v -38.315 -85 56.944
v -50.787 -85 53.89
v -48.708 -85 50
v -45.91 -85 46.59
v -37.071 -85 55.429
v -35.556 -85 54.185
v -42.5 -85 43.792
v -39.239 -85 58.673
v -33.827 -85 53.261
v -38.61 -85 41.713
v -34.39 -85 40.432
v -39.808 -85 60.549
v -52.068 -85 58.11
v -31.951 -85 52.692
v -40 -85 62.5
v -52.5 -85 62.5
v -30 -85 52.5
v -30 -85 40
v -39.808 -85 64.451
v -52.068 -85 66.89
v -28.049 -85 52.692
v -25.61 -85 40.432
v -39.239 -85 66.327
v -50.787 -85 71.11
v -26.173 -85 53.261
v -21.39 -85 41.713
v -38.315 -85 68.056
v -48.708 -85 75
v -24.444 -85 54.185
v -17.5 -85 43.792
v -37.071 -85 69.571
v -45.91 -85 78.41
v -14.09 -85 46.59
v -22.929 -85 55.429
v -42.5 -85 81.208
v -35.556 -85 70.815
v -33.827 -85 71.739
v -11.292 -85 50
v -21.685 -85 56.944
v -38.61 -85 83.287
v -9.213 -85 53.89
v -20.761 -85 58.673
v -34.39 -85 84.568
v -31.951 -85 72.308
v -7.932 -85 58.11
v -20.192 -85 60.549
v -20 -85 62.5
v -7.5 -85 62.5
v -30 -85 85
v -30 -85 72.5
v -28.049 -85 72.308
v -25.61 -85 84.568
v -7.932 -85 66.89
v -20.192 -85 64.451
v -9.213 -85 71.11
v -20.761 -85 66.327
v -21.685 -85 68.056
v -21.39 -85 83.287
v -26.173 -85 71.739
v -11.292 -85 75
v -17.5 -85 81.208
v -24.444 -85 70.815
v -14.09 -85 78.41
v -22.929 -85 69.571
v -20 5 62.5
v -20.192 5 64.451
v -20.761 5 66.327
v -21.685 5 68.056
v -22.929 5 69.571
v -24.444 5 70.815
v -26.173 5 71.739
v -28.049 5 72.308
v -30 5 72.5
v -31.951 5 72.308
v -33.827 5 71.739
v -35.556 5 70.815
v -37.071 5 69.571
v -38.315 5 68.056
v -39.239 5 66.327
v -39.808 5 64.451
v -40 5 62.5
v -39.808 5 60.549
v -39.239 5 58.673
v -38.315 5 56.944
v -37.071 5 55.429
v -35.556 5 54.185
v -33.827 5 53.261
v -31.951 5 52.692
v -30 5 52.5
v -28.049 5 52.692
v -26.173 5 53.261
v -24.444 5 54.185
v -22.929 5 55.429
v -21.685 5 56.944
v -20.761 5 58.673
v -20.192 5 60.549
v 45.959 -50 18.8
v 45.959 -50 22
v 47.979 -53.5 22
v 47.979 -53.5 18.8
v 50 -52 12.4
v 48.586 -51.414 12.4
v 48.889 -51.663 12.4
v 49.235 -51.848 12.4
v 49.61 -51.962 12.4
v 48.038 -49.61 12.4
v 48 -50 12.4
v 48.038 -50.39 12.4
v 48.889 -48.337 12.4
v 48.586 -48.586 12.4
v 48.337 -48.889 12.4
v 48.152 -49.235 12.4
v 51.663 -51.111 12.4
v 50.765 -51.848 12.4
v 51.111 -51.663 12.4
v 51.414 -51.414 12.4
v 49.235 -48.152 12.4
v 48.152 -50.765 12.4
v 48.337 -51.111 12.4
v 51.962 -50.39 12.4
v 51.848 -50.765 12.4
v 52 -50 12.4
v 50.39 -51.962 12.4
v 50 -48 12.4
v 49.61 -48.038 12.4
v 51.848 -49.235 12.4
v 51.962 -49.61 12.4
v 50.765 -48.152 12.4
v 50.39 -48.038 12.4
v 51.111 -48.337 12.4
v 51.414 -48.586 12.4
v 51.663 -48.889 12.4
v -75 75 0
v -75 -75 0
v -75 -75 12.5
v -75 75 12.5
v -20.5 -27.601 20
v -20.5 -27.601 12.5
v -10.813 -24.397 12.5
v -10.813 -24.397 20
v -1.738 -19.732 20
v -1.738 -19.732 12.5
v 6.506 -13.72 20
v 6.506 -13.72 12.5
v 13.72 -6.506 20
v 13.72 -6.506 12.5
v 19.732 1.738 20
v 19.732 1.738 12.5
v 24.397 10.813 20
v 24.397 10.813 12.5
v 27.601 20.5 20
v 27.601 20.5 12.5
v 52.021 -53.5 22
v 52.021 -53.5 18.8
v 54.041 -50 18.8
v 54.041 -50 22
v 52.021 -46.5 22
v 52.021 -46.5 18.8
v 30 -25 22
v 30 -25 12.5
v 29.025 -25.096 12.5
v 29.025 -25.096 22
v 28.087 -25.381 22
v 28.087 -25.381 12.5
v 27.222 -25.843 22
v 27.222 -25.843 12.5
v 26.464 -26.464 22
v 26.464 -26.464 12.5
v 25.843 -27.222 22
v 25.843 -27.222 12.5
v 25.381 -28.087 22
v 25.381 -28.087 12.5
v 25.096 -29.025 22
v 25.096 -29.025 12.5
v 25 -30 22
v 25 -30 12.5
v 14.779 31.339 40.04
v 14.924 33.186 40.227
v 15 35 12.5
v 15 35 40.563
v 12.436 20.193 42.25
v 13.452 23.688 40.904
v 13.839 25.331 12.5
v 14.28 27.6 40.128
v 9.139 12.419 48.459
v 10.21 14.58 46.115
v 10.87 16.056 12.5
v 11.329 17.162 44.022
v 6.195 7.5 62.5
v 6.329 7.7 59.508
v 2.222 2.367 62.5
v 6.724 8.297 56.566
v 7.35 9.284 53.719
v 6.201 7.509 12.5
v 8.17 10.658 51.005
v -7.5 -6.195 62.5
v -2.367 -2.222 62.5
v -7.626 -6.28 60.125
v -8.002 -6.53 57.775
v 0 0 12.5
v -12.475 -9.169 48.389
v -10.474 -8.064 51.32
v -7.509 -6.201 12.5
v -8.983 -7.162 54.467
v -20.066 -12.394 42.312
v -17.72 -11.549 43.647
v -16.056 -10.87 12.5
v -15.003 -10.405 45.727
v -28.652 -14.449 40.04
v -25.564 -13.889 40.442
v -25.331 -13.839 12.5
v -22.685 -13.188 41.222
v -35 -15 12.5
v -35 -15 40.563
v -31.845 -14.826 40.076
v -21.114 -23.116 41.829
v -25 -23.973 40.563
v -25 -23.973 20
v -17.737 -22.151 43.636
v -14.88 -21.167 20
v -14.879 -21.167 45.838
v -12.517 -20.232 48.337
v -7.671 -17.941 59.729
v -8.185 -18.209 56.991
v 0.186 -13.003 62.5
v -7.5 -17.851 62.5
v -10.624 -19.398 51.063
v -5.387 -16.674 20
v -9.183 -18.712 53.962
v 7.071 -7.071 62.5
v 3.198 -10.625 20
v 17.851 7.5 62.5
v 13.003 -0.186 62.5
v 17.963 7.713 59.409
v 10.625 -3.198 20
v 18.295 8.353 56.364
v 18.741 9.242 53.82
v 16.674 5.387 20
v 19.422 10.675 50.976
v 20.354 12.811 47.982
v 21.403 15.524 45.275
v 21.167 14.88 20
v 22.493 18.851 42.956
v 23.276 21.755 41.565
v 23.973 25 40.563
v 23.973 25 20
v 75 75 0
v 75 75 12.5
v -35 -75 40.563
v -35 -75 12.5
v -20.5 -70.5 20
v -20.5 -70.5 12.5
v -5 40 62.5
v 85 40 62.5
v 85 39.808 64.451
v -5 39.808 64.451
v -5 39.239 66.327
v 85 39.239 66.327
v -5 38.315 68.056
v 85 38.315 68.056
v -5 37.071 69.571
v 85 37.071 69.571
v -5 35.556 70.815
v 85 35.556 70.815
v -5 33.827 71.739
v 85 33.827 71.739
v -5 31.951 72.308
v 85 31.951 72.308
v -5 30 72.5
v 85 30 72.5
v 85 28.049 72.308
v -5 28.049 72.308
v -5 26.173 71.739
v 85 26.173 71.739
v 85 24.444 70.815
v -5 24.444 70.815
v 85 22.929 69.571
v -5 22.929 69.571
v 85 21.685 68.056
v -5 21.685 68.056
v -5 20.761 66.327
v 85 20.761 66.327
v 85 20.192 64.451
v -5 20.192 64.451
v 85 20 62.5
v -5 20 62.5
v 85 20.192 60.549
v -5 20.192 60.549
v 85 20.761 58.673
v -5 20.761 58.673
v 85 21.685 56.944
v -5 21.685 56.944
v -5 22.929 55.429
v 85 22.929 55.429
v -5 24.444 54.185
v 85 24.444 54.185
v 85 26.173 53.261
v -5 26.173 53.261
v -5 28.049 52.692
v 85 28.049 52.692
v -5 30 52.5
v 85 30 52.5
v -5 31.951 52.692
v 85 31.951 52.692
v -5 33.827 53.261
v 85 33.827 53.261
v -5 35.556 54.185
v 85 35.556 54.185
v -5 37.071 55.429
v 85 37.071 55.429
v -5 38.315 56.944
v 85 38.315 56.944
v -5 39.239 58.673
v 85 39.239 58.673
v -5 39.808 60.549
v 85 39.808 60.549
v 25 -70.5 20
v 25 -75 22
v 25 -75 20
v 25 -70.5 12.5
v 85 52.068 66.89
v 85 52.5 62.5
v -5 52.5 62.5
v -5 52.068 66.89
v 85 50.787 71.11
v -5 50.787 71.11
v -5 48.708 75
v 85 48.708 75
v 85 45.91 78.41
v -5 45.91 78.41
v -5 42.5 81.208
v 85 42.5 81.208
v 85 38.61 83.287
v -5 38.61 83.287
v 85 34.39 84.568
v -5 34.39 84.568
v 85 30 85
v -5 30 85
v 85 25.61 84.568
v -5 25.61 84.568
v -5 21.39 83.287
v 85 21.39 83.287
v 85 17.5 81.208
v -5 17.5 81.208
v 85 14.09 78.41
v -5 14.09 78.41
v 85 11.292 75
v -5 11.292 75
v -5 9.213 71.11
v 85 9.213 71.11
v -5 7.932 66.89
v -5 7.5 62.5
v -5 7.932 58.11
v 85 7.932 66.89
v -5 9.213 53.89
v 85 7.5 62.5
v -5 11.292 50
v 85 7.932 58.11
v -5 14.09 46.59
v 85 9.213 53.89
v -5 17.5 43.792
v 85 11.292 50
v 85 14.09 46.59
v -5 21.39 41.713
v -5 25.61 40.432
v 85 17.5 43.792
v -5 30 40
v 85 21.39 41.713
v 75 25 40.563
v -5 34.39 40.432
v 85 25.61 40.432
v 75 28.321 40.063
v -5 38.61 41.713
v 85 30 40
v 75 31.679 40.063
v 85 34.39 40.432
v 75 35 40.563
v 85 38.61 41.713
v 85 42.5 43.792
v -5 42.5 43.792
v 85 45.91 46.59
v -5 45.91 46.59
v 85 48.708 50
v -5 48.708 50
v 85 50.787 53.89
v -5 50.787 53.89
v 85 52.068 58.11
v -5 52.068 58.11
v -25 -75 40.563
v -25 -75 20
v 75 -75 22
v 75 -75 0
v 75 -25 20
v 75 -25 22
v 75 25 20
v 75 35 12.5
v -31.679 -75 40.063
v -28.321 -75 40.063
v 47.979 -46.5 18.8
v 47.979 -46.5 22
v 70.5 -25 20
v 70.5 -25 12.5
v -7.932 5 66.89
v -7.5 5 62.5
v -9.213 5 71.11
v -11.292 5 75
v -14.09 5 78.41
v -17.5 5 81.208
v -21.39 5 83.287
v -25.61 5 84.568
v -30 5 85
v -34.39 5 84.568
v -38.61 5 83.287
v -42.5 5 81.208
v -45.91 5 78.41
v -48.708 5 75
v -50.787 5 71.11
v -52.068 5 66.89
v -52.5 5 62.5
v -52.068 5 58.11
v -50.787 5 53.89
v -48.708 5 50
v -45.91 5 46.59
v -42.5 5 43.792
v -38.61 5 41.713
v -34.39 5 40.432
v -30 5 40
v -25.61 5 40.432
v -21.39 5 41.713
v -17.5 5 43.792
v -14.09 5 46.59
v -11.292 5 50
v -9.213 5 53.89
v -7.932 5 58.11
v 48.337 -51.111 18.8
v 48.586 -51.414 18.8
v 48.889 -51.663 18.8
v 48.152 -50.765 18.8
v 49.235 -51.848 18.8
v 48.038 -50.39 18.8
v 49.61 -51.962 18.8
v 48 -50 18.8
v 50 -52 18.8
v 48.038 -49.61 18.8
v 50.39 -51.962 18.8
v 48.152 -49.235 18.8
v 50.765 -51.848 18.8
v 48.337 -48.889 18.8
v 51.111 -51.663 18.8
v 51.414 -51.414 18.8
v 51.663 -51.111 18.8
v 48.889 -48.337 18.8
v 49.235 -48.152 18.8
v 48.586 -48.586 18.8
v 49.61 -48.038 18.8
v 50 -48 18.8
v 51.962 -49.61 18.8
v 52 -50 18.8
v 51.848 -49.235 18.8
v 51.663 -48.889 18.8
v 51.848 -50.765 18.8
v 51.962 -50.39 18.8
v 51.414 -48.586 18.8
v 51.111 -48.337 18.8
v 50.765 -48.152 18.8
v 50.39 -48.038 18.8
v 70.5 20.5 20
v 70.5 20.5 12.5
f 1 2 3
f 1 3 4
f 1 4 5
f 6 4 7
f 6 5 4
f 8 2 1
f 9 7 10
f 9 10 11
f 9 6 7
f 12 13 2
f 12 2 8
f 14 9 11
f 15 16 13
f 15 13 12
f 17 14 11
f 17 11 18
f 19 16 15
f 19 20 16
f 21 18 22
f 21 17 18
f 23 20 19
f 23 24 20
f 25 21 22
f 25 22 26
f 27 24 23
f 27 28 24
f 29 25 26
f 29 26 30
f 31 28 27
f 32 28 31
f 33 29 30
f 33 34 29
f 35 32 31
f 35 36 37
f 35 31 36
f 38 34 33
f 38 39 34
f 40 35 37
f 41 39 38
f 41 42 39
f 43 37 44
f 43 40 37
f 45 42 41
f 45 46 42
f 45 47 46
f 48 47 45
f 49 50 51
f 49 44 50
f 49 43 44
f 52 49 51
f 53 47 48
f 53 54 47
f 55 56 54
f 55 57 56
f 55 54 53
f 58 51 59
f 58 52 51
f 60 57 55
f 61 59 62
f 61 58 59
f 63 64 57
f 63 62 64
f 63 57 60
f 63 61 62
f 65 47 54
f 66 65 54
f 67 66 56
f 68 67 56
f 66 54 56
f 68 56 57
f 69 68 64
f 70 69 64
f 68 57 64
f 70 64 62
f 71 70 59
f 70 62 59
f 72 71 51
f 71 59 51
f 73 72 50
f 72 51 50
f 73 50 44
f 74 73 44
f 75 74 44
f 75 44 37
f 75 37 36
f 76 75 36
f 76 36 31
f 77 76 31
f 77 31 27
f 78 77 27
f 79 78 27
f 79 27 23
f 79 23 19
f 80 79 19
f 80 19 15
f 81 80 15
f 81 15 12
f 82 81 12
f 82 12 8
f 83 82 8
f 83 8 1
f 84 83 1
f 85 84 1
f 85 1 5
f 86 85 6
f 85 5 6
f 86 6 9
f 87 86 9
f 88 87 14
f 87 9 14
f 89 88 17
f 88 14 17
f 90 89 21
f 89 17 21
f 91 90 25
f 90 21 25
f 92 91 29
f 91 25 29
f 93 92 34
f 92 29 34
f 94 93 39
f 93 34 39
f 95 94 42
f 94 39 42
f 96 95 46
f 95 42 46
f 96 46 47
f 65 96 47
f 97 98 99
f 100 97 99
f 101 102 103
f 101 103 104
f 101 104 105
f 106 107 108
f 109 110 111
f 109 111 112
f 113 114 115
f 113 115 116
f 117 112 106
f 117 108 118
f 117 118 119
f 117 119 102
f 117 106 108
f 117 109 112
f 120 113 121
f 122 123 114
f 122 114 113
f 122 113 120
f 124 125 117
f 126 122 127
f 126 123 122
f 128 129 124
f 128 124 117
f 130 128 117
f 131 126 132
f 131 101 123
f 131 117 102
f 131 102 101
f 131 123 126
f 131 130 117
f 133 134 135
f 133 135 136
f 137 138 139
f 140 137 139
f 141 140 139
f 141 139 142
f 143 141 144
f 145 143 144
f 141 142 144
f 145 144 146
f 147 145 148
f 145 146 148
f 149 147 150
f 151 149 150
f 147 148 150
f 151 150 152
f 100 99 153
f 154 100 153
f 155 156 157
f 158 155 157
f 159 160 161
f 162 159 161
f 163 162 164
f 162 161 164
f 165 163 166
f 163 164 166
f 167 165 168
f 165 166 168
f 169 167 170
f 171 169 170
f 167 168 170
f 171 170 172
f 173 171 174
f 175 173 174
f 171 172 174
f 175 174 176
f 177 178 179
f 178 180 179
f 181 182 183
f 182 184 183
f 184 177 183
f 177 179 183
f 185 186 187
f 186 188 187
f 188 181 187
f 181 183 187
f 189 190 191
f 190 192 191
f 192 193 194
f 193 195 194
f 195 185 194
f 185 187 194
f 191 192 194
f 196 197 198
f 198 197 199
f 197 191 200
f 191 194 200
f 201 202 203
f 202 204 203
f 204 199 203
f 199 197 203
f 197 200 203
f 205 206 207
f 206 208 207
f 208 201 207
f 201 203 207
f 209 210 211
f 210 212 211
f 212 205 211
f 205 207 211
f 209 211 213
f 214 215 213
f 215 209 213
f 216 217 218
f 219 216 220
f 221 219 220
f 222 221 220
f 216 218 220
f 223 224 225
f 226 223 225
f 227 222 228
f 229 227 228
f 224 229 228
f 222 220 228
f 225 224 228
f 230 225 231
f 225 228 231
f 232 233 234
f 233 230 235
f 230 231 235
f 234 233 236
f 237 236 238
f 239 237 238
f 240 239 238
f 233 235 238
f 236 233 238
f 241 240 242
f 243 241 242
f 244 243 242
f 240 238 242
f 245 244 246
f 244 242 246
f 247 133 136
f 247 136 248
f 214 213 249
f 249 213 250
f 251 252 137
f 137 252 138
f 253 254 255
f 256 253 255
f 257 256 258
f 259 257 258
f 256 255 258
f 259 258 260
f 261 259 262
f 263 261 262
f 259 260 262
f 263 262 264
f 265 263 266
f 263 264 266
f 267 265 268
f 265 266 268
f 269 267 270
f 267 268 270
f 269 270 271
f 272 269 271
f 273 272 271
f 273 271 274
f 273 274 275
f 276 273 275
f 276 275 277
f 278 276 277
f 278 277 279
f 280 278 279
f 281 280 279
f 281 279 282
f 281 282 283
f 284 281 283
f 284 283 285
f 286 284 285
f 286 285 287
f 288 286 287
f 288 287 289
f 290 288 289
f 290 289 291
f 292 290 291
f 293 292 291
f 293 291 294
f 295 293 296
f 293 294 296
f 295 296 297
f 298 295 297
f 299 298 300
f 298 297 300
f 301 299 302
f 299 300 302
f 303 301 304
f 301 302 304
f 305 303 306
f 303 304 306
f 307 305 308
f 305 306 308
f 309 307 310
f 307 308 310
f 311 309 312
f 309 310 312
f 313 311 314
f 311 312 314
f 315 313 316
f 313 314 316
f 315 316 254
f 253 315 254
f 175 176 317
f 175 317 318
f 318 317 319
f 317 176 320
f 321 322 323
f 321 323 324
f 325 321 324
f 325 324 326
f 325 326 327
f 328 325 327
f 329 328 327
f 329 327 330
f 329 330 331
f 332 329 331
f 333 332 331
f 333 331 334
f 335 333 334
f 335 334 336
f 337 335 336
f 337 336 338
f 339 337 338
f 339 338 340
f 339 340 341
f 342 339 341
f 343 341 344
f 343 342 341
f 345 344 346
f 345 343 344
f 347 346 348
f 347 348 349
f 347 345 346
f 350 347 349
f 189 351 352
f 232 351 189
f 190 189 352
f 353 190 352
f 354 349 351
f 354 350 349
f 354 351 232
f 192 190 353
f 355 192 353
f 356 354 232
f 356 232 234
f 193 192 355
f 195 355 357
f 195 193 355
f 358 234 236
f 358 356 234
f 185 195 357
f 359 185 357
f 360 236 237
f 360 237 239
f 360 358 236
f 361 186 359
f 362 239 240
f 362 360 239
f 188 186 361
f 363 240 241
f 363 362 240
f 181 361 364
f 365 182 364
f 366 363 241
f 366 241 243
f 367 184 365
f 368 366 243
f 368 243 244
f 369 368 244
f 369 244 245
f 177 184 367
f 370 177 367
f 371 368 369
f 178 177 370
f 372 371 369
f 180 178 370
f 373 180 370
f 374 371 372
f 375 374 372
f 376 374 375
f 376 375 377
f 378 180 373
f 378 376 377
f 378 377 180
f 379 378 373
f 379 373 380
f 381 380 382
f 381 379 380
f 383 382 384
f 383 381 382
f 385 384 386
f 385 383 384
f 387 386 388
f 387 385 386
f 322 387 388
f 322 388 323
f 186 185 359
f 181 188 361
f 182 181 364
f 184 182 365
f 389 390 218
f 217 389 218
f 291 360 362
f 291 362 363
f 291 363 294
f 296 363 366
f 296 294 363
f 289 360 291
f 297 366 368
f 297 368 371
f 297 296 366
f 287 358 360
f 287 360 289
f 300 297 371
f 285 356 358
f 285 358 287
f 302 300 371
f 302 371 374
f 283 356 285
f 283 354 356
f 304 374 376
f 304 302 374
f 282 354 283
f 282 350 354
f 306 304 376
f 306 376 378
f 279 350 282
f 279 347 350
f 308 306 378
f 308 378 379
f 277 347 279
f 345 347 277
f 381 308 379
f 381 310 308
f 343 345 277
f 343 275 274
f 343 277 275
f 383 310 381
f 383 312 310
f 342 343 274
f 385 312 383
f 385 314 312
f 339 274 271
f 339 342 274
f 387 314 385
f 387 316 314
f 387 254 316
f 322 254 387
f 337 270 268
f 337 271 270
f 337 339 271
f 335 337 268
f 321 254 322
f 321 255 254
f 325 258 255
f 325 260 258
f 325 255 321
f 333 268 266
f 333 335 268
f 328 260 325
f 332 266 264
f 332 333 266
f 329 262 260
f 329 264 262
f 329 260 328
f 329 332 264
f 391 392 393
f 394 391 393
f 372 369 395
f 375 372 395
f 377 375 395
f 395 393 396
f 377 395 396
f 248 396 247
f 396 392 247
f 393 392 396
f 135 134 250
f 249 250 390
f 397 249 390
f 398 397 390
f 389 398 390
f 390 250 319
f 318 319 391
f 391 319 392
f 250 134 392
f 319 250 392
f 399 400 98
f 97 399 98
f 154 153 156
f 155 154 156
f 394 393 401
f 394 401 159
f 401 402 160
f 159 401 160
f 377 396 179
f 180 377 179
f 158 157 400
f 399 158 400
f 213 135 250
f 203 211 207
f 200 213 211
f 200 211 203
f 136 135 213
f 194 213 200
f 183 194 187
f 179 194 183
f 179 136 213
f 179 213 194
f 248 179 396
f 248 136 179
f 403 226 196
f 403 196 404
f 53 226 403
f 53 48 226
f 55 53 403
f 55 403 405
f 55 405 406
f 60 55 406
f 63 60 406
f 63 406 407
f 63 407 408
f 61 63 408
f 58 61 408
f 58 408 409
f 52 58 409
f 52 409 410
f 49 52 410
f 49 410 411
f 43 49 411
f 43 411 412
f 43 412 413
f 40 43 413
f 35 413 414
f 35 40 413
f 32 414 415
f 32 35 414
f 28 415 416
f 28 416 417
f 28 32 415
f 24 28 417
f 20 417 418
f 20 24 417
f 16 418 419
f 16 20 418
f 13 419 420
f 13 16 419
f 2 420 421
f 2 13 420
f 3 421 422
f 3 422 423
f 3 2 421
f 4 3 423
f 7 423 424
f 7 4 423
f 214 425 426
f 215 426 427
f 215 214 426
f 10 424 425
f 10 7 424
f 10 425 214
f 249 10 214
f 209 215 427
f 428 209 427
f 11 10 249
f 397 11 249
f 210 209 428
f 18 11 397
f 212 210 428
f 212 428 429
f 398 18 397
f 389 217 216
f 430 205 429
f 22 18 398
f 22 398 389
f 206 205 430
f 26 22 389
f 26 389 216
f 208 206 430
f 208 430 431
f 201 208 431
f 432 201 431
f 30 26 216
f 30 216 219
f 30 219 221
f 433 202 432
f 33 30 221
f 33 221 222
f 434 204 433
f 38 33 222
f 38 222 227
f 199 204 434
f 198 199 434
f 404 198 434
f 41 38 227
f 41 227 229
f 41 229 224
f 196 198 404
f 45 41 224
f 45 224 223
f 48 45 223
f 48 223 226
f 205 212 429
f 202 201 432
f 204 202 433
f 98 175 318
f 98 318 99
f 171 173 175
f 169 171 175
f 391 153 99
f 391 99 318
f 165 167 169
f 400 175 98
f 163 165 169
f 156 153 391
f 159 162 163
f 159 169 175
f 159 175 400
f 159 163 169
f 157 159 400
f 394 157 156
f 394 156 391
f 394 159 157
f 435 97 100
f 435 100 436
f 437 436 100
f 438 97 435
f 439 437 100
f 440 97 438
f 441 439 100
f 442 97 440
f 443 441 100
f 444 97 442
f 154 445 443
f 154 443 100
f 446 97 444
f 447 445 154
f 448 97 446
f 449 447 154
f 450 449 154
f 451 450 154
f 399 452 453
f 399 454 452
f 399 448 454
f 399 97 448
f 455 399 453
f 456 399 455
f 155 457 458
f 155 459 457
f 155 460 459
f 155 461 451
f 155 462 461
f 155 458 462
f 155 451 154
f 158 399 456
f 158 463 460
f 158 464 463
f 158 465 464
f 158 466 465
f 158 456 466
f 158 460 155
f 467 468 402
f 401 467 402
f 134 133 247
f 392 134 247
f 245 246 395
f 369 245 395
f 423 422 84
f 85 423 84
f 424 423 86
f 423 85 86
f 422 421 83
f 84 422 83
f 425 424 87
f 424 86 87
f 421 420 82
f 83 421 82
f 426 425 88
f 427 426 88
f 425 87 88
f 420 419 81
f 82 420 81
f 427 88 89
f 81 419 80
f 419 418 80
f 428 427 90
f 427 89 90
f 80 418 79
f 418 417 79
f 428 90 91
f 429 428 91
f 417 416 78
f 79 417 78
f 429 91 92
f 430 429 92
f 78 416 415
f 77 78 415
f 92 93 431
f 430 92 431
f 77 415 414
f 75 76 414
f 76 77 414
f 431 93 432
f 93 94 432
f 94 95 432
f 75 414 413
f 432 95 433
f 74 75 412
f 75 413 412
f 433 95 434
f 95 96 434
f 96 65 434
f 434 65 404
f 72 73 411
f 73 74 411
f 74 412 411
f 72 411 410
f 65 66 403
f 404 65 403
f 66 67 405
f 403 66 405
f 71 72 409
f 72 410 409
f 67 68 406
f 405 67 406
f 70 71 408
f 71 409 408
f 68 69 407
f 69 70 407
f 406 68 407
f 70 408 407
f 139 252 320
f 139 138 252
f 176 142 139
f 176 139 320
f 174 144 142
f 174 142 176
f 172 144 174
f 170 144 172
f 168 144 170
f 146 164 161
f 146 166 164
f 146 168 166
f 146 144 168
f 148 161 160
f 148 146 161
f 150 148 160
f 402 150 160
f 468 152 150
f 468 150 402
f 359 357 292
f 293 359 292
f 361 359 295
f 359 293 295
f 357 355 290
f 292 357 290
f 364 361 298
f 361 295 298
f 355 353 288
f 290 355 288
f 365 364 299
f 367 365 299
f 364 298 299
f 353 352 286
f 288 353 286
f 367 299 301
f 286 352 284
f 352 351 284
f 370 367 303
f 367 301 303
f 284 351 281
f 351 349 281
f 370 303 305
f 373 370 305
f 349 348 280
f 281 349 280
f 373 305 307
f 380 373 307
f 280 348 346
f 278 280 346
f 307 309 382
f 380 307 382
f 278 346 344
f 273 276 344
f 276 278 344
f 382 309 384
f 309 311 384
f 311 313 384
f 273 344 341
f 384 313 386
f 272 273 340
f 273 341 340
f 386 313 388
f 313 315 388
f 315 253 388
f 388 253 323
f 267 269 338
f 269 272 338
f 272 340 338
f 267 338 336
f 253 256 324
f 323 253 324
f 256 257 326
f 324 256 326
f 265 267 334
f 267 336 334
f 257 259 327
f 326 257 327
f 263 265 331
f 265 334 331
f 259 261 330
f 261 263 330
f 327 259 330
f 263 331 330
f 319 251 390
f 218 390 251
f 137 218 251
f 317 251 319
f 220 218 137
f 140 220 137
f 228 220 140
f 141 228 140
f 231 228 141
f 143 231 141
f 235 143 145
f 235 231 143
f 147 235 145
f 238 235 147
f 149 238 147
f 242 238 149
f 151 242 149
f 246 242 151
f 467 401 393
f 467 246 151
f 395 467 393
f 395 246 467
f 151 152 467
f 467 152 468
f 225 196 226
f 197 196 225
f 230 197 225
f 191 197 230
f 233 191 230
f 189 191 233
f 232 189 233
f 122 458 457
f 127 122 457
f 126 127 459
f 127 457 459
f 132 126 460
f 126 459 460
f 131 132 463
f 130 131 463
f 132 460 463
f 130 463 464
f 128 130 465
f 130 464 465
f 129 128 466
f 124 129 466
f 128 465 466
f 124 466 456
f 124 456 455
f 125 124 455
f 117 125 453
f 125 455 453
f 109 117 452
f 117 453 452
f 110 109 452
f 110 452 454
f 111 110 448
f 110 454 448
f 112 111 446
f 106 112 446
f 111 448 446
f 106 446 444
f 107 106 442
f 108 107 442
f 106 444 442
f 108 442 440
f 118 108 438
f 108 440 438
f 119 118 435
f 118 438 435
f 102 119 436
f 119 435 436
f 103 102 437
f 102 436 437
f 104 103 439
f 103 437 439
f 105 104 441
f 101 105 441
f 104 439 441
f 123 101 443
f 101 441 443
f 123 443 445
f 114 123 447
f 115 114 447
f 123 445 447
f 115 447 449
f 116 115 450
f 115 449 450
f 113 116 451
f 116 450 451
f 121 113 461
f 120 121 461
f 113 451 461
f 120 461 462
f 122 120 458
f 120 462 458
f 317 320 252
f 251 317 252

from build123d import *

# Parameters (mm, degrees)
F0_W      = 150
F0_H      = 150
F1_DEPTH  = 12.5
F3_DEPTH  = 50
F5_R      = 22.5
F6_DEPTH  = 90
F8_R      = 22.5
F9_DEPTH  = 90
F11_DEPTH = 9.5
F13_DEPTH = 7.5
F15_DEPTH = 3.2
F16_R     = 2
F17_DEPTH = 6.4
F18_R     = 10
F19_DEPTH = 160.001
F20_R     = 10
F21_DEPTH = 160.001


with BuildPart() as f1:
    # F0 (on Top) → F1 (new body)
    with BuildSketch(Plane.XY):
        Rectangle(F0_W, F0_H)
    extrude(amount=F1_DEPTH)

    # F2 (on face) → F3 (join)
    with BuildSketch(Plane.XY.offset(12.5)):
        with BuildLine():
            Line((-35, -15), (-35, -75))
            Line((-35, -75), (-25, -75))
            Line((-25, -75), (-25, -23.9734782516))
            ThreePointArc((-25, -23.9734782516), (7.0710678119, -7.0710678119), (23.9734782516, 25))
            Line((23.9734782516, 25), (75, 25))
            Line((75, 25), (75, 35))
            Line((75, 35), (15, 35))
            ThreePointArc((15, 35), (0, 0), (-35, -15))
        make_face()
    extrude(amount=F3_DEPTH)

    # F5 (on offset) → F6 (join)
    with BuildSketch(Plane.XZ.offset(85)):
        with Locations((-30, 62.5)):
            Circle(F5_R)
    extrude(amount=-F6_DEPTH)

    # F8 (on offset) → F9 (join)
    with BuildSketch(Plane.YZ.offset(85)):
        with Locations((30, 62.5)):
            Circle(F8_R)
    extrude(amount=-F9_DEPTH)

    # F10 (on face) → F11 (join)
    with BuildSketch(Plane.XY.offset(12.5)):
        with BuildLine():
            Line((25, -75), (75, -75))
            Line((75, -75), (75, -25))
            Line((75, -25), (30, -25))
            ThreePointArc((30, -25), (26.4644660941, -26.4644660941), (25, -30))
            Line((25, -30), (25, -75))
        make_face()
    extrude(amount=F11_DEPTH)

    # F12 (on face) → F13 (join)
    with BuildSketch(Plane.XY.offset(12.5)):
        with BuildLine():
            Line((27.6014252577, 20.5), (70.5, 20.5))
            Line((70.5, 20.5), (70.5, -25))
            Line((70.5, -25), (75, -25))
            Line((75, -25), (75, 25))
            Line((75, 25), (23.9734782516, 25))
            ThreePointArc((23.9734782516, 25), (7.0710678119, -7.0710678119), (-25, -23.9734782516))
            Line((-25, -23.9734782516), (-25, -75))
            Line((-25, -75), (25, -75))
            Line((25, -75), (25, -70.5))
            Line((25, -70.5), (-20.5, -70.5))
            Line((-20.5, -70.5), (-20.5, -27.6014252577))
            ThreePointArc((-20.5, -27.6014252577), (10.2530483272, -10.2530483272), (27.6014252577, 20.5))
        make_face()
    extrude(amount=F13_DEPTH)

    # F14 (on face) → F15 (cut)
    with BuildSketch(Plane.XY.offset(22)):
        Polygon((52.0207259422, -46.5), (47.9792740578, -46.5), (45.9585481157, -50), (47.9792740578, -53.5), (52.0207259422, -53.5), (54.0414518843, -50), align=None)
    extrude(amount=-F15_DEPTH, mode=Mode.SUBTRACT)

    # F16 (on face) → F17 (cut)
    with BuildSketch(Plane.XY.offset(18.8)):
        with Locations((50, -50)):
            Circle(F16_R)
    extrude(amount=-F17_DEPTH, mode=Mode.SUBTRACT)

    # F18 (on face) → F19 (cut, through all)
    with BuildSketch(Plane.XZ.offset(85)):
        with Locations((-30, 62.5)):
            Circle(F18_R)
    extrude(amount=-F19_DEPTH, mode=Mode.SUBTRACT)

    # F20 (on face) → F21 (cut, through all)
    with BuildSketch(Plane.YZ.offset(85)):
        with Locations((30, 62.5)):
            Circle(F20_R)
    extrude(amount=-F21_DEPTH, mode=Mode.SUBTRACT)


solid = f1.part
